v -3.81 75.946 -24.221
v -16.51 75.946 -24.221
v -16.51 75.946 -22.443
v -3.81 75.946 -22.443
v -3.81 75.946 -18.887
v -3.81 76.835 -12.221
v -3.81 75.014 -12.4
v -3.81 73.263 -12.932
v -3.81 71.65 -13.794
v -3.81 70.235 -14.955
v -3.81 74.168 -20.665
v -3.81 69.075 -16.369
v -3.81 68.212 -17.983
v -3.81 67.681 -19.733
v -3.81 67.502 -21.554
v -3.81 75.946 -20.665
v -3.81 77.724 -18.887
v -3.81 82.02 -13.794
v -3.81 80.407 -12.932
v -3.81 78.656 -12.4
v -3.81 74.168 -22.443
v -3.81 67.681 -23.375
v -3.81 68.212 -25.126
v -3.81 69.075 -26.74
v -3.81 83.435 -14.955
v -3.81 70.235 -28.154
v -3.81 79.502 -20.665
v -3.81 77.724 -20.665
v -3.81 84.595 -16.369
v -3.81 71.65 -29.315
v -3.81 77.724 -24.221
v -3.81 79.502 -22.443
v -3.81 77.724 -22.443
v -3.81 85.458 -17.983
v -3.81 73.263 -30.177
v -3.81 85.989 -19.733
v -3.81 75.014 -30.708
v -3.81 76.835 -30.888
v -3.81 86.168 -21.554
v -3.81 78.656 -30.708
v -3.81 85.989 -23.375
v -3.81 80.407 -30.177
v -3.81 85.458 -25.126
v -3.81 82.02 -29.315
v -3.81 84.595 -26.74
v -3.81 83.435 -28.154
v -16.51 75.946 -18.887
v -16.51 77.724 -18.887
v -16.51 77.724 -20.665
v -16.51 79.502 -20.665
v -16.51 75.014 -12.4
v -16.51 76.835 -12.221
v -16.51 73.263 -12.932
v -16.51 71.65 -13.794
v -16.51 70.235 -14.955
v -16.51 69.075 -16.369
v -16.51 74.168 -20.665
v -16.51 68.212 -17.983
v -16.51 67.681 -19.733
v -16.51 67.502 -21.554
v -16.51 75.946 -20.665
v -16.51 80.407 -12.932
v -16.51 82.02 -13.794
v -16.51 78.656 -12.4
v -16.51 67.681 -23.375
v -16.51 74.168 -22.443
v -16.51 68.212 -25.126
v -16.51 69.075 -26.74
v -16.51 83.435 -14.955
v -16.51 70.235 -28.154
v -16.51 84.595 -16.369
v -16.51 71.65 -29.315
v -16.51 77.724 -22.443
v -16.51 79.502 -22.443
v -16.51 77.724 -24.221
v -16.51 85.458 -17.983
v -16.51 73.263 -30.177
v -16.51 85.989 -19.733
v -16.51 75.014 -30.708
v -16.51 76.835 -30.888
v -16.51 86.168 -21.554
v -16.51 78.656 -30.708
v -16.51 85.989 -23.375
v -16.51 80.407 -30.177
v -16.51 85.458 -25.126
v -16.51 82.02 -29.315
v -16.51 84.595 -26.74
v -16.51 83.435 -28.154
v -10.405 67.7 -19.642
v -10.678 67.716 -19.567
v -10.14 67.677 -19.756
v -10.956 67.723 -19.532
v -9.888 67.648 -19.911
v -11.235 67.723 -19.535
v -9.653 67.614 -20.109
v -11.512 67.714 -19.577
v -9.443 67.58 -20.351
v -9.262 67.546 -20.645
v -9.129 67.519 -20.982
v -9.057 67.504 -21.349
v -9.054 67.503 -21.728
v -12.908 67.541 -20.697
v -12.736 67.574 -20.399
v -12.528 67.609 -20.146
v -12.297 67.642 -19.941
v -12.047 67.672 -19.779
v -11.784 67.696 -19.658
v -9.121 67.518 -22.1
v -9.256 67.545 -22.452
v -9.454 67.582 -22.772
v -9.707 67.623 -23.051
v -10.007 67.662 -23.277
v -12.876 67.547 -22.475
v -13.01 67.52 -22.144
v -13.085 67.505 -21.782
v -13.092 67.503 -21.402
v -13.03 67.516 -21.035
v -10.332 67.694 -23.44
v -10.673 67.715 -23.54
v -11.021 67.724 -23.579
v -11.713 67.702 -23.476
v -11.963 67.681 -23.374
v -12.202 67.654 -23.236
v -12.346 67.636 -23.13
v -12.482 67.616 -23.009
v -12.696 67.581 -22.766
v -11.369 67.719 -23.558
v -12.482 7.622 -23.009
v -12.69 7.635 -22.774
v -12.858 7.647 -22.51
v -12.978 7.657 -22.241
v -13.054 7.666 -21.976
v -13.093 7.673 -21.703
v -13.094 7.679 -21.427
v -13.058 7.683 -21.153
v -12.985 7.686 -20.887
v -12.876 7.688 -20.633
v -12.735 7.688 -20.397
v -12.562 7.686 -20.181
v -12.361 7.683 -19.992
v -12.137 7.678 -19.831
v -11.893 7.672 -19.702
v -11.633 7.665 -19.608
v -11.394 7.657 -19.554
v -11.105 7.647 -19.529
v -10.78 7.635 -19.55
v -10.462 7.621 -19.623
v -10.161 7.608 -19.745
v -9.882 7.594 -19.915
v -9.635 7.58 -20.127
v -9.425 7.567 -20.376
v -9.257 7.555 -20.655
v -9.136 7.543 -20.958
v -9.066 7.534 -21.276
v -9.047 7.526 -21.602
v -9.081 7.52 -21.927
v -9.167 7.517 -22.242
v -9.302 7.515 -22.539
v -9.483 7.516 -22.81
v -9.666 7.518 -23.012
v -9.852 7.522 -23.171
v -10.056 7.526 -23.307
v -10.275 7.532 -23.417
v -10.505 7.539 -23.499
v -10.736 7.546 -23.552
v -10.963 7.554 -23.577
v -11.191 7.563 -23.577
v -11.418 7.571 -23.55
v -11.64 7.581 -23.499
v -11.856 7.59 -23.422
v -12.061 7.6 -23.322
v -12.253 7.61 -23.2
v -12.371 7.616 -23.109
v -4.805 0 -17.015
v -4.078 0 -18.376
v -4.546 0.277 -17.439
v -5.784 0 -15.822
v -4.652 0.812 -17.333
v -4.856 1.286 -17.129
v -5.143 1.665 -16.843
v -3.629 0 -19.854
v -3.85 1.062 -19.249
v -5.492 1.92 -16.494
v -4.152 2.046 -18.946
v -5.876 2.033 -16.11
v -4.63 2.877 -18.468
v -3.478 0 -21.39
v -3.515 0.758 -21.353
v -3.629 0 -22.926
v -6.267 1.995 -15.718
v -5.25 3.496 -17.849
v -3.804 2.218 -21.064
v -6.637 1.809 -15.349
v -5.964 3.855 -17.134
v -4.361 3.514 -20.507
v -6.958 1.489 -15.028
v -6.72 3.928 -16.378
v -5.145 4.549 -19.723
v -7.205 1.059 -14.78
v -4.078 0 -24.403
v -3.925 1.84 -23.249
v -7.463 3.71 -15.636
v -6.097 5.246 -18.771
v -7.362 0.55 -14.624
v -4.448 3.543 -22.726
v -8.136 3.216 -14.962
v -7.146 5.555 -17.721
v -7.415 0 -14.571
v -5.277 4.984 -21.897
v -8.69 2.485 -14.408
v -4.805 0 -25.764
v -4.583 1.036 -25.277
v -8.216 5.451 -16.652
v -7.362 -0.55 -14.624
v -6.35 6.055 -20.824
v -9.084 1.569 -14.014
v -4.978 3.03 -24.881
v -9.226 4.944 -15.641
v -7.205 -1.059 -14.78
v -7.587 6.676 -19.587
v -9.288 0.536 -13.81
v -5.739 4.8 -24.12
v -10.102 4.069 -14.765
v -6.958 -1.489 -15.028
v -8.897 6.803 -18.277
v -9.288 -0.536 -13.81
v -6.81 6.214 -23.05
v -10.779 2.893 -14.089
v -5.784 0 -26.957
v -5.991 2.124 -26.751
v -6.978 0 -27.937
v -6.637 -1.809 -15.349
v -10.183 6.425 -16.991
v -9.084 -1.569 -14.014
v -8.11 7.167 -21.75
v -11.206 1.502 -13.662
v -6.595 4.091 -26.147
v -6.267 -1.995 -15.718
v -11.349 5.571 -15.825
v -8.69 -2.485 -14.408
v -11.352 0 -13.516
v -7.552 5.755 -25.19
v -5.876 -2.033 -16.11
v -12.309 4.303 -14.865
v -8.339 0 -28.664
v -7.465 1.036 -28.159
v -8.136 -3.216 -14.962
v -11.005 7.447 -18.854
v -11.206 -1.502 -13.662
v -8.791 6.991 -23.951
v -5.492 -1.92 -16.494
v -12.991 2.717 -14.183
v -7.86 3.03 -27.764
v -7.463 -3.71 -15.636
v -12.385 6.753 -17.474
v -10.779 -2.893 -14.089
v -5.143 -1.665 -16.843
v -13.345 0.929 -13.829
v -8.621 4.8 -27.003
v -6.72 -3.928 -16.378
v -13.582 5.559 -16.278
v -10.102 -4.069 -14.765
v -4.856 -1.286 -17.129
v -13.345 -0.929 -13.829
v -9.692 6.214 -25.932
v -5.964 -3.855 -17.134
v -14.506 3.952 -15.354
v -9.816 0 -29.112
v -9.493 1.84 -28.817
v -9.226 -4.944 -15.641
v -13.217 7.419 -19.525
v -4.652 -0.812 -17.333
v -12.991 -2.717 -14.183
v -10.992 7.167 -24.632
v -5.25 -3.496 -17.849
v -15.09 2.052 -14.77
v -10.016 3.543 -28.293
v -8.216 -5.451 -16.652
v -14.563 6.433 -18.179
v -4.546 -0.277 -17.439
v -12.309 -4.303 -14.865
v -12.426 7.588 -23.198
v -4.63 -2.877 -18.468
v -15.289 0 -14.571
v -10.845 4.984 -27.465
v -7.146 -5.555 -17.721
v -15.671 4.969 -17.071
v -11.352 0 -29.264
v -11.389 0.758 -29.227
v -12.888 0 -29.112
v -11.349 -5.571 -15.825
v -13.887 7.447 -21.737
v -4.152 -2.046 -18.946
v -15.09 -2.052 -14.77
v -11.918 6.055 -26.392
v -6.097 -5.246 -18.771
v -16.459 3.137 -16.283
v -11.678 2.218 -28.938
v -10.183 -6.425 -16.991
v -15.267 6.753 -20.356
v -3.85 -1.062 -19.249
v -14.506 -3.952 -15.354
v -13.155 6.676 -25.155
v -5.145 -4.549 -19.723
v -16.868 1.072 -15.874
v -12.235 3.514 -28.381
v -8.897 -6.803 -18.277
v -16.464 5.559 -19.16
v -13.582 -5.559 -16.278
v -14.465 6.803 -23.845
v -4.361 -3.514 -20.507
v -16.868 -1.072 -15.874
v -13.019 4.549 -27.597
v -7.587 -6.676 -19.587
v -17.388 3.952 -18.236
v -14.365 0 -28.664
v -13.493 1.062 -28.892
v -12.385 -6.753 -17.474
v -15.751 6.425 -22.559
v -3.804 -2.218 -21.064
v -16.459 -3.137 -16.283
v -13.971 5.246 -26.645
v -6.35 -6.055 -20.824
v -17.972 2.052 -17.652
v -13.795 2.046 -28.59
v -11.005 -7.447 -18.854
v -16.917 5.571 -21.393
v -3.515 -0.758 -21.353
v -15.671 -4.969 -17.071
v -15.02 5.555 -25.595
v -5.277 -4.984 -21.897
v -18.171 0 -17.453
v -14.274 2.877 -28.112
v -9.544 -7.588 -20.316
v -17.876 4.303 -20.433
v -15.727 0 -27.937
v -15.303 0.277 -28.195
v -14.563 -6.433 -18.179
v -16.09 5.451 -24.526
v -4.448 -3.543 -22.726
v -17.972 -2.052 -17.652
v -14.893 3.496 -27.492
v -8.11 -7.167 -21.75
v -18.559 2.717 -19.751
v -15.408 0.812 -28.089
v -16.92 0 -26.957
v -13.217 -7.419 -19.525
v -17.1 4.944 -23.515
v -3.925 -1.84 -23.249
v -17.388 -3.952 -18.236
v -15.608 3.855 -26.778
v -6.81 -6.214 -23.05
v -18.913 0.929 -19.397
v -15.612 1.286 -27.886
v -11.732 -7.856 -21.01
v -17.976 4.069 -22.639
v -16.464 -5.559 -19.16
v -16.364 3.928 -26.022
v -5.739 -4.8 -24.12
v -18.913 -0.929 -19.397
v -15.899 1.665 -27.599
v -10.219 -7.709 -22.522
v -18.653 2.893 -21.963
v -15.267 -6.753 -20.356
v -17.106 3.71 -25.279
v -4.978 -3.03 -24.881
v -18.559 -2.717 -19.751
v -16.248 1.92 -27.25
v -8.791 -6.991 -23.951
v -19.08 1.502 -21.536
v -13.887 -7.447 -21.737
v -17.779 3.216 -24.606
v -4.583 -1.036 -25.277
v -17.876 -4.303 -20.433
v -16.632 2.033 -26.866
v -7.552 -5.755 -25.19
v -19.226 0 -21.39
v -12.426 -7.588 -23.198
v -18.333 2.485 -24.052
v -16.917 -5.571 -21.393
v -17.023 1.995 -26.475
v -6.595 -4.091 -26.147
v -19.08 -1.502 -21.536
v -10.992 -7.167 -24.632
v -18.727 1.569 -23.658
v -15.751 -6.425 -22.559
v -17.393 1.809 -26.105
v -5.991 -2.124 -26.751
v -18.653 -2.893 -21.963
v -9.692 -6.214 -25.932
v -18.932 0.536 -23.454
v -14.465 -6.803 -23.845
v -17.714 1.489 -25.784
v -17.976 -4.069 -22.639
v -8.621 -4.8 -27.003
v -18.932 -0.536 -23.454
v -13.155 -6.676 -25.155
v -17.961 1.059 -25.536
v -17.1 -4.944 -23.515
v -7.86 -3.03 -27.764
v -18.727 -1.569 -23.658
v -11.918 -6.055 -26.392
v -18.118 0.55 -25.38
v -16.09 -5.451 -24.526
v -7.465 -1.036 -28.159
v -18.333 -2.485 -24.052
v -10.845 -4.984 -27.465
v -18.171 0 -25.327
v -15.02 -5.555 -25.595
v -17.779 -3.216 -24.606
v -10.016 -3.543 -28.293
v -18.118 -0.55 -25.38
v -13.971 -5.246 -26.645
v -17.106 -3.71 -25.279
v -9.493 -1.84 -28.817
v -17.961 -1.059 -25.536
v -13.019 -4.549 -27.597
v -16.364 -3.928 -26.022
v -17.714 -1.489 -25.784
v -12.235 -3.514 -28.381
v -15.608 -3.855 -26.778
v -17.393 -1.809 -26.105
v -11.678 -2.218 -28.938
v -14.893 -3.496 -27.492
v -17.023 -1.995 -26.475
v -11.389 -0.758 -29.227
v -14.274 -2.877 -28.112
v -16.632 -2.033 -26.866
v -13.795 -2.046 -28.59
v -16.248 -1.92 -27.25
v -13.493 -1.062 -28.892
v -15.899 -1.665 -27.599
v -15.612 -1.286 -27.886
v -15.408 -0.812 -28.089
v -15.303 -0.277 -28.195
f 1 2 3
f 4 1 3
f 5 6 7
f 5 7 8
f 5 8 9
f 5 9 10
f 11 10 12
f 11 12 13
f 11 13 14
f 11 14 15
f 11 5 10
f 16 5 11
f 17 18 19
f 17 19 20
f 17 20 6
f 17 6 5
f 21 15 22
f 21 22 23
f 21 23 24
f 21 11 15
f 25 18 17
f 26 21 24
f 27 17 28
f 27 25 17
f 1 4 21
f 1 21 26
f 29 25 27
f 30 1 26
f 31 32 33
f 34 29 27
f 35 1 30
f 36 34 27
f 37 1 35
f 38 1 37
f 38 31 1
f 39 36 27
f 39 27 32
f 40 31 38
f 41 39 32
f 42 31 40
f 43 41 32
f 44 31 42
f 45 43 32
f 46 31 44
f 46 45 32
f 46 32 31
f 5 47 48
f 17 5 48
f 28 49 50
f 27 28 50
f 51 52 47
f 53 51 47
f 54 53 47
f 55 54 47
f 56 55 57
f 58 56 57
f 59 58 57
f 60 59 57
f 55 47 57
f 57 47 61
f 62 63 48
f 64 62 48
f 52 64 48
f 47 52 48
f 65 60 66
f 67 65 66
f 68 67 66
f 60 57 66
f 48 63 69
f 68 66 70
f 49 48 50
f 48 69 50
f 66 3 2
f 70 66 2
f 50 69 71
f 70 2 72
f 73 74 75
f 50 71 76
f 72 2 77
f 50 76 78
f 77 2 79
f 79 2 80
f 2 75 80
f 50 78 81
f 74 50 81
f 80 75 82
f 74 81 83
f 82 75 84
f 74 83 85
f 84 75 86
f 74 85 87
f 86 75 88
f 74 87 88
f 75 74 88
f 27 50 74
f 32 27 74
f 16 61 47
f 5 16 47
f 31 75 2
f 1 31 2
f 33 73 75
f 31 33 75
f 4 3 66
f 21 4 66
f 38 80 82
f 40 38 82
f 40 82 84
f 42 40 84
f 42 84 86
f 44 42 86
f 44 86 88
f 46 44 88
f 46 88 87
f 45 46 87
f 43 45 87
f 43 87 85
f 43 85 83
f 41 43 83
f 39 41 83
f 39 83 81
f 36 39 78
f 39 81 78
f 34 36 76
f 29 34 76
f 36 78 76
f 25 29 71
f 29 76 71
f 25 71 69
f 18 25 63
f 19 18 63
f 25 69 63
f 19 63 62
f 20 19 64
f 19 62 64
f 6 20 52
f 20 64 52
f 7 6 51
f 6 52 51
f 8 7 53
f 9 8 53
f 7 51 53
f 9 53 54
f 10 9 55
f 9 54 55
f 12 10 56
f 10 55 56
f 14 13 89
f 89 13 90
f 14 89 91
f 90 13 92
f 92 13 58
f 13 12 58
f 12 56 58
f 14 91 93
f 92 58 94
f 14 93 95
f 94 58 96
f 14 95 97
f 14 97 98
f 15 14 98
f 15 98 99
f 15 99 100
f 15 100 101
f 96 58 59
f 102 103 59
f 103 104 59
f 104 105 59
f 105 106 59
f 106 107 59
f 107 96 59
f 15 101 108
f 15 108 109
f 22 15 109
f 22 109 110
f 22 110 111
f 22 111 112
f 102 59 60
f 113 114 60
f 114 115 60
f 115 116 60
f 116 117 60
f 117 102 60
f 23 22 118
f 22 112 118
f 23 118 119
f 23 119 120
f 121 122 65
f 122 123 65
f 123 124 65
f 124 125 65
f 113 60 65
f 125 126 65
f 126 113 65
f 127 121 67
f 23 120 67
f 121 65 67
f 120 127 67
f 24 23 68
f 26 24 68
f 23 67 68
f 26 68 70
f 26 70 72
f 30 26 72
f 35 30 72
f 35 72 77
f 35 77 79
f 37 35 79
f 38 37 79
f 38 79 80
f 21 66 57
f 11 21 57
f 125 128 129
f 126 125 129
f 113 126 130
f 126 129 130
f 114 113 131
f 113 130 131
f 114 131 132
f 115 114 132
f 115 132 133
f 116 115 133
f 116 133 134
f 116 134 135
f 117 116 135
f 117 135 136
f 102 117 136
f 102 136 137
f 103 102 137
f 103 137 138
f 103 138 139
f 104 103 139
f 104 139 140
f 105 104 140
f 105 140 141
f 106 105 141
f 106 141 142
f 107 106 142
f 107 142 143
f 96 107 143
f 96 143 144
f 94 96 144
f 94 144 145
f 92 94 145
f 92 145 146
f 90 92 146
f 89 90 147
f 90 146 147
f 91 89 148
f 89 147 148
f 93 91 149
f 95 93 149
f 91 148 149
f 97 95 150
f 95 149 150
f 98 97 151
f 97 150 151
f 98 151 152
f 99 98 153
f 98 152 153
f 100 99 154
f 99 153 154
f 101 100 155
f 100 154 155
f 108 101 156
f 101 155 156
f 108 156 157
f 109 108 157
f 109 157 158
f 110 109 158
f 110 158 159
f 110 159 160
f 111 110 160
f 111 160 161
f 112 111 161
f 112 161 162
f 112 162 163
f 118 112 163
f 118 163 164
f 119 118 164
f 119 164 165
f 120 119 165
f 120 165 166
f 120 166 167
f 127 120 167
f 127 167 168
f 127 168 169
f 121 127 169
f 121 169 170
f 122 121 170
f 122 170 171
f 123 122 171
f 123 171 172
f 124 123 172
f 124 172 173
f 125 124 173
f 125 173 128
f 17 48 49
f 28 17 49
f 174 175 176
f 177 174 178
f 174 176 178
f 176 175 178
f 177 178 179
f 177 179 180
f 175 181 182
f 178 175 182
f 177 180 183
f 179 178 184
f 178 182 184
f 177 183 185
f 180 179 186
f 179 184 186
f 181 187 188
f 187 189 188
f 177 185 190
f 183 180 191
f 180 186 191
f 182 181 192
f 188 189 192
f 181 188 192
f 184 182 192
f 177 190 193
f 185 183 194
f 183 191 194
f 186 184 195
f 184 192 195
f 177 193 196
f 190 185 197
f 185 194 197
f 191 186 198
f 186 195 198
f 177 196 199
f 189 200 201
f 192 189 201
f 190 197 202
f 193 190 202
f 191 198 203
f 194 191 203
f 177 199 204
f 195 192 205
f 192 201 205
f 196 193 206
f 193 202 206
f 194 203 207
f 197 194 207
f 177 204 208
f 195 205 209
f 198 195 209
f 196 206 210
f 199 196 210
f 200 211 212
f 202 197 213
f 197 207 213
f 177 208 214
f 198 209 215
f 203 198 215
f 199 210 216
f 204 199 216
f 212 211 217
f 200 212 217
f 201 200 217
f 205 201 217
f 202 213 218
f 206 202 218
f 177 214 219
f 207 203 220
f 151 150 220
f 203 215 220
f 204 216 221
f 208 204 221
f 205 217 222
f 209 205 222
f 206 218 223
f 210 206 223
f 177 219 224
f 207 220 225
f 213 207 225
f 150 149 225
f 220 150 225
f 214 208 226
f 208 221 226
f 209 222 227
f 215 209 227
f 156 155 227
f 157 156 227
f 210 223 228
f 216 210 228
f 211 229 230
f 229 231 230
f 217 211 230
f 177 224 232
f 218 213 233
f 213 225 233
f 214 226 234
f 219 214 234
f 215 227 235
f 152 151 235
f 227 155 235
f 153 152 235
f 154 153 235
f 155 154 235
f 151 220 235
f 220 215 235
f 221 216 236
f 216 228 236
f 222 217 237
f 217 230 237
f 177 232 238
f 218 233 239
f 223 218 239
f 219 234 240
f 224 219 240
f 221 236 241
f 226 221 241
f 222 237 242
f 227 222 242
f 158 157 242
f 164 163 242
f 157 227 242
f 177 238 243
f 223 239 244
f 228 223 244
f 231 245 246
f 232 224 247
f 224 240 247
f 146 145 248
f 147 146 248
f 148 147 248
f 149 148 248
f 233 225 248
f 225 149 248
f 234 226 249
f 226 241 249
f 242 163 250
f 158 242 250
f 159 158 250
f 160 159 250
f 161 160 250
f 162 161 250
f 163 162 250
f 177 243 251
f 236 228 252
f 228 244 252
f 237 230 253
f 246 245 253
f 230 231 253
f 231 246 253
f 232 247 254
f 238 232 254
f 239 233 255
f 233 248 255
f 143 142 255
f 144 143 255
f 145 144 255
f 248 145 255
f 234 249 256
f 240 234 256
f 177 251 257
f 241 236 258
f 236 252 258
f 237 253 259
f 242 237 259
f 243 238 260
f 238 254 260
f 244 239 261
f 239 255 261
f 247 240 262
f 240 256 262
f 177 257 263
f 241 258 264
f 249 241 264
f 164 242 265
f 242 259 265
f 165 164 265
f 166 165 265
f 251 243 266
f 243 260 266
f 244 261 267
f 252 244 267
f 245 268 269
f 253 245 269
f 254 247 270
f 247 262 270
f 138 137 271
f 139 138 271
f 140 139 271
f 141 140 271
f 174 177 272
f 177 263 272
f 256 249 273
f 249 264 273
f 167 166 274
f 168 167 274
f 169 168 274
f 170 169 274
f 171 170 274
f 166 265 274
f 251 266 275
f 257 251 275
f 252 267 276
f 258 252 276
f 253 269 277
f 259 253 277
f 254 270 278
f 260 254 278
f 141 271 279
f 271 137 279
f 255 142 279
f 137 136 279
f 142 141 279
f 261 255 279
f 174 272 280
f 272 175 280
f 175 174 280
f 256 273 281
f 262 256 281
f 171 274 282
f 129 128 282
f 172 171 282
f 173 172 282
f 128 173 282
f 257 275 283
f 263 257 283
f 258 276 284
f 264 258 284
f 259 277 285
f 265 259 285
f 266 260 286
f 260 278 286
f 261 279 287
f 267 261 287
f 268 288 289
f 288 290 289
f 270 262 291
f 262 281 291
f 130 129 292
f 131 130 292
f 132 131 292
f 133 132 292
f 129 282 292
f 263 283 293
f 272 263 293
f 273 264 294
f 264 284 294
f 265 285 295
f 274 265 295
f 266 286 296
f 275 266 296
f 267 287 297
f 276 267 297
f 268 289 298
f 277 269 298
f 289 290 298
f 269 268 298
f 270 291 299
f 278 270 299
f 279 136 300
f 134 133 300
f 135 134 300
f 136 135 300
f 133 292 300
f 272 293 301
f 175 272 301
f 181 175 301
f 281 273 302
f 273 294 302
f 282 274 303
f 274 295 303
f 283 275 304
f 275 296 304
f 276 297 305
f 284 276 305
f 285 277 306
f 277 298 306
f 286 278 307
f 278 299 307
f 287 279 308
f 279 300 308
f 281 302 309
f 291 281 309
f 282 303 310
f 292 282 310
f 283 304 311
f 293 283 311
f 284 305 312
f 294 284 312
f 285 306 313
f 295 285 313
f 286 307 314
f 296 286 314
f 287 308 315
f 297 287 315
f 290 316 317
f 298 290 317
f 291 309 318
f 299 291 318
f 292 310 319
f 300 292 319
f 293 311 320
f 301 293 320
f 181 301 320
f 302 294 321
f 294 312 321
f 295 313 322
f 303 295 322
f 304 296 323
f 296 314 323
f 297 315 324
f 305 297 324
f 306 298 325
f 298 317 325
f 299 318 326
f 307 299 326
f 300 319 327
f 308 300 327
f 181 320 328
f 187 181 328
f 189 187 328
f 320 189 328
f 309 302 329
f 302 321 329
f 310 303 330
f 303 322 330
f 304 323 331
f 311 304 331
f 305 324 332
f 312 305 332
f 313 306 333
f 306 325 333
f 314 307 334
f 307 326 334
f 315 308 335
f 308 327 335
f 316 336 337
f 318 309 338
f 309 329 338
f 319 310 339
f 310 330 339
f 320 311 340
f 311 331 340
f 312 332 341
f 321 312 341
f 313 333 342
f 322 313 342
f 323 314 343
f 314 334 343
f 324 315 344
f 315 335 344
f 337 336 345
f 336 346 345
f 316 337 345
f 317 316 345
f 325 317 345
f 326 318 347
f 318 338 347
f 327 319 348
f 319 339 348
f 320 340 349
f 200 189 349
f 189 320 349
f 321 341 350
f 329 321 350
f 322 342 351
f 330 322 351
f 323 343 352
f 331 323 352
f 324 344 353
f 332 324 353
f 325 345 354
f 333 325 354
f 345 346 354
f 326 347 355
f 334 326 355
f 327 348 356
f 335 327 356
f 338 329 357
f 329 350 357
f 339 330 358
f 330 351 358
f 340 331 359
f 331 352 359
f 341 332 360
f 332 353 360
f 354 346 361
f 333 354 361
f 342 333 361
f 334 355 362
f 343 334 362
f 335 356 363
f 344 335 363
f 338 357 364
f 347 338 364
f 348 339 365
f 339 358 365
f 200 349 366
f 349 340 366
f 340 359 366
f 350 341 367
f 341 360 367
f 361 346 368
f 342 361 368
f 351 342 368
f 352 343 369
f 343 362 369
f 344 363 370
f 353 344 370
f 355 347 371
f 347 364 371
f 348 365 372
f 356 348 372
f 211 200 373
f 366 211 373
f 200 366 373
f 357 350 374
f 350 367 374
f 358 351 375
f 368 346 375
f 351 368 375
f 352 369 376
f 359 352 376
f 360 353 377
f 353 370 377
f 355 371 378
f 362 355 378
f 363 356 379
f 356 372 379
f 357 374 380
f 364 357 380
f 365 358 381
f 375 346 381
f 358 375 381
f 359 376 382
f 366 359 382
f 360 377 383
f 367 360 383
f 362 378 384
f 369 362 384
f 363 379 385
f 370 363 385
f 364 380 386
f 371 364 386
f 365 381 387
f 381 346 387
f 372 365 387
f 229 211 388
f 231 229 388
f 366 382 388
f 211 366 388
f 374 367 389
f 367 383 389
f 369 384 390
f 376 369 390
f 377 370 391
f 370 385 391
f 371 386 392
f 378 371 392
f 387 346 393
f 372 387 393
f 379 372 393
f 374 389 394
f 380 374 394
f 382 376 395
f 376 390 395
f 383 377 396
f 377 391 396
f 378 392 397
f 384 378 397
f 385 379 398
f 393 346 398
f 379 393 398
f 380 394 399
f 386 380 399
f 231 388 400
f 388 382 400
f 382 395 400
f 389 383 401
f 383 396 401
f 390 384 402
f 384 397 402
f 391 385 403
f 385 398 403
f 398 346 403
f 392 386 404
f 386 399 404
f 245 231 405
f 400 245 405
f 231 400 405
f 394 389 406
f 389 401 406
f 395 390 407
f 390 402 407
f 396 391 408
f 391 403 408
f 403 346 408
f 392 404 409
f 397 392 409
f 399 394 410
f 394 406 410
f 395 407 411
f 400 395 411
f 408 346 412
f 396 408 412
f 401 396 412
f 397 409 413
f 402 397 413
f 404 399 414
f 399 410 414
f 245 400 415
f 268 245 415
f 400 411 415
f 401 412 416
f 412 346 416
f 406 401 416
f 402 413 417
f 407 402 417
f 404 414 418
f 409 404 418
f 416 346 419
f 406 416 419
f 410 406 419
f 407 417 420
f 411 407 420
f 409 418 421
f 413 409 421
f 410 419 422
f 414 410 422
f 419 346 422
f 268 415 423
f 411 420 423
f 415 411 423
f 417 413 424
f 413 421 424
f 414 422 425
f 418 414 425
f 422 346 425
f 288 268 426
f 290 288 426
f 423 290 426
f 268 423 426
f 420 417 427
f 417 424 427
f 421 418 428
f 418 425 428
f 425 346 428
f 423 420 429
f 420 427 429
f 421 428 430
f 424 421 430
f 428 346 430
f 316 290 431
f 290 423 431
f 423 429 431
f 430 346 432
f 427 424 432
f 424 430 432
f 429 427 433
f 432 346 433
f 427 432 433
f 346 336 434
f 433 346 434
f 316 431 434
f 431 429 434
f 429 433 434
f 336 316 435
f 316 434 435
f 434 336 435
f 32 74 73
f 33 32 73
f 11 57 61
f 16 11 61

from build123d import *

# Parameters (mm, degrees)
SKETCH3_R           = 2.025729463
BOSS_EXTRUDE1_DEPTH = 74.168
BOSS_EXTRUDE5_START = -16.51
SKETCH4_R           = 9.333271044
BOSS_EXTRUDE5_DEPTH = 12.7


with BuildPart() as part:
    # Sketch1 → Revolve1 (revolve)
    with BuildSketch(Plane(origin=(0, 0, 0), x_dir=(1, 0, 0), z_dir=(0, 1, 0))):
        with BuildLine():
            Line((-16.919904062, 26.957438718), (-5.784386472, 15.821921128))
            ThreePointArc((-5.784386472, 15.821921128), (-5.784386472, 26.957438718), (-16.919904062, 26.957438718))
        make_face()
    revolve(axis=Axis((-16.919904062, 0, -26.957438718), (0.7071067811865476, 0, 0.7071067811865476)))

    # Sketch3 → Boss-Extrude1 (add)
    with BuildSketch(Plane(origin=(0, 0, 0), x_dir=(1, 0, 0), z_dir=(0, 1, 0))):
        with Locations(Location((-11.072249639, 21.554324411, 0), (0, 0, 134.105346527))):
            Circle(SKETCH3_R)
    extrude(amount=BOSS_EXTRUDE1_DEPTH)

    # Sketch4 → Boss-Extrude5 (add)
    with BuildSketch(Plane(origin=(0, 0, 0), x_dir=(0, 0, -1), z_dir=(1, 0, 0)).offset(BOSS_EXTRUDE5_START)):
        with Locations((21.554324411, 76.835)):
            Circle(SKETCH4_R)
        Polygon((22.443324411, 75.946), (22.443324411, 74.168), (20.665324411, 74.168), (20.665324411, 75.946), (18.887324411, 75.946), (18.887324411, 77.724), (20.665324411, 77.724), (20.665324411, 79.502), (22.443324411, 79.502), (22.443324411, 77.724), (24.221324411, 77.724), (24.221324411, 75.946), align=None, mode=Mode.SUBTRACT)
    extrude(amount=BOSS_EXTRUDE5_DEPTH)


solid = part.part
